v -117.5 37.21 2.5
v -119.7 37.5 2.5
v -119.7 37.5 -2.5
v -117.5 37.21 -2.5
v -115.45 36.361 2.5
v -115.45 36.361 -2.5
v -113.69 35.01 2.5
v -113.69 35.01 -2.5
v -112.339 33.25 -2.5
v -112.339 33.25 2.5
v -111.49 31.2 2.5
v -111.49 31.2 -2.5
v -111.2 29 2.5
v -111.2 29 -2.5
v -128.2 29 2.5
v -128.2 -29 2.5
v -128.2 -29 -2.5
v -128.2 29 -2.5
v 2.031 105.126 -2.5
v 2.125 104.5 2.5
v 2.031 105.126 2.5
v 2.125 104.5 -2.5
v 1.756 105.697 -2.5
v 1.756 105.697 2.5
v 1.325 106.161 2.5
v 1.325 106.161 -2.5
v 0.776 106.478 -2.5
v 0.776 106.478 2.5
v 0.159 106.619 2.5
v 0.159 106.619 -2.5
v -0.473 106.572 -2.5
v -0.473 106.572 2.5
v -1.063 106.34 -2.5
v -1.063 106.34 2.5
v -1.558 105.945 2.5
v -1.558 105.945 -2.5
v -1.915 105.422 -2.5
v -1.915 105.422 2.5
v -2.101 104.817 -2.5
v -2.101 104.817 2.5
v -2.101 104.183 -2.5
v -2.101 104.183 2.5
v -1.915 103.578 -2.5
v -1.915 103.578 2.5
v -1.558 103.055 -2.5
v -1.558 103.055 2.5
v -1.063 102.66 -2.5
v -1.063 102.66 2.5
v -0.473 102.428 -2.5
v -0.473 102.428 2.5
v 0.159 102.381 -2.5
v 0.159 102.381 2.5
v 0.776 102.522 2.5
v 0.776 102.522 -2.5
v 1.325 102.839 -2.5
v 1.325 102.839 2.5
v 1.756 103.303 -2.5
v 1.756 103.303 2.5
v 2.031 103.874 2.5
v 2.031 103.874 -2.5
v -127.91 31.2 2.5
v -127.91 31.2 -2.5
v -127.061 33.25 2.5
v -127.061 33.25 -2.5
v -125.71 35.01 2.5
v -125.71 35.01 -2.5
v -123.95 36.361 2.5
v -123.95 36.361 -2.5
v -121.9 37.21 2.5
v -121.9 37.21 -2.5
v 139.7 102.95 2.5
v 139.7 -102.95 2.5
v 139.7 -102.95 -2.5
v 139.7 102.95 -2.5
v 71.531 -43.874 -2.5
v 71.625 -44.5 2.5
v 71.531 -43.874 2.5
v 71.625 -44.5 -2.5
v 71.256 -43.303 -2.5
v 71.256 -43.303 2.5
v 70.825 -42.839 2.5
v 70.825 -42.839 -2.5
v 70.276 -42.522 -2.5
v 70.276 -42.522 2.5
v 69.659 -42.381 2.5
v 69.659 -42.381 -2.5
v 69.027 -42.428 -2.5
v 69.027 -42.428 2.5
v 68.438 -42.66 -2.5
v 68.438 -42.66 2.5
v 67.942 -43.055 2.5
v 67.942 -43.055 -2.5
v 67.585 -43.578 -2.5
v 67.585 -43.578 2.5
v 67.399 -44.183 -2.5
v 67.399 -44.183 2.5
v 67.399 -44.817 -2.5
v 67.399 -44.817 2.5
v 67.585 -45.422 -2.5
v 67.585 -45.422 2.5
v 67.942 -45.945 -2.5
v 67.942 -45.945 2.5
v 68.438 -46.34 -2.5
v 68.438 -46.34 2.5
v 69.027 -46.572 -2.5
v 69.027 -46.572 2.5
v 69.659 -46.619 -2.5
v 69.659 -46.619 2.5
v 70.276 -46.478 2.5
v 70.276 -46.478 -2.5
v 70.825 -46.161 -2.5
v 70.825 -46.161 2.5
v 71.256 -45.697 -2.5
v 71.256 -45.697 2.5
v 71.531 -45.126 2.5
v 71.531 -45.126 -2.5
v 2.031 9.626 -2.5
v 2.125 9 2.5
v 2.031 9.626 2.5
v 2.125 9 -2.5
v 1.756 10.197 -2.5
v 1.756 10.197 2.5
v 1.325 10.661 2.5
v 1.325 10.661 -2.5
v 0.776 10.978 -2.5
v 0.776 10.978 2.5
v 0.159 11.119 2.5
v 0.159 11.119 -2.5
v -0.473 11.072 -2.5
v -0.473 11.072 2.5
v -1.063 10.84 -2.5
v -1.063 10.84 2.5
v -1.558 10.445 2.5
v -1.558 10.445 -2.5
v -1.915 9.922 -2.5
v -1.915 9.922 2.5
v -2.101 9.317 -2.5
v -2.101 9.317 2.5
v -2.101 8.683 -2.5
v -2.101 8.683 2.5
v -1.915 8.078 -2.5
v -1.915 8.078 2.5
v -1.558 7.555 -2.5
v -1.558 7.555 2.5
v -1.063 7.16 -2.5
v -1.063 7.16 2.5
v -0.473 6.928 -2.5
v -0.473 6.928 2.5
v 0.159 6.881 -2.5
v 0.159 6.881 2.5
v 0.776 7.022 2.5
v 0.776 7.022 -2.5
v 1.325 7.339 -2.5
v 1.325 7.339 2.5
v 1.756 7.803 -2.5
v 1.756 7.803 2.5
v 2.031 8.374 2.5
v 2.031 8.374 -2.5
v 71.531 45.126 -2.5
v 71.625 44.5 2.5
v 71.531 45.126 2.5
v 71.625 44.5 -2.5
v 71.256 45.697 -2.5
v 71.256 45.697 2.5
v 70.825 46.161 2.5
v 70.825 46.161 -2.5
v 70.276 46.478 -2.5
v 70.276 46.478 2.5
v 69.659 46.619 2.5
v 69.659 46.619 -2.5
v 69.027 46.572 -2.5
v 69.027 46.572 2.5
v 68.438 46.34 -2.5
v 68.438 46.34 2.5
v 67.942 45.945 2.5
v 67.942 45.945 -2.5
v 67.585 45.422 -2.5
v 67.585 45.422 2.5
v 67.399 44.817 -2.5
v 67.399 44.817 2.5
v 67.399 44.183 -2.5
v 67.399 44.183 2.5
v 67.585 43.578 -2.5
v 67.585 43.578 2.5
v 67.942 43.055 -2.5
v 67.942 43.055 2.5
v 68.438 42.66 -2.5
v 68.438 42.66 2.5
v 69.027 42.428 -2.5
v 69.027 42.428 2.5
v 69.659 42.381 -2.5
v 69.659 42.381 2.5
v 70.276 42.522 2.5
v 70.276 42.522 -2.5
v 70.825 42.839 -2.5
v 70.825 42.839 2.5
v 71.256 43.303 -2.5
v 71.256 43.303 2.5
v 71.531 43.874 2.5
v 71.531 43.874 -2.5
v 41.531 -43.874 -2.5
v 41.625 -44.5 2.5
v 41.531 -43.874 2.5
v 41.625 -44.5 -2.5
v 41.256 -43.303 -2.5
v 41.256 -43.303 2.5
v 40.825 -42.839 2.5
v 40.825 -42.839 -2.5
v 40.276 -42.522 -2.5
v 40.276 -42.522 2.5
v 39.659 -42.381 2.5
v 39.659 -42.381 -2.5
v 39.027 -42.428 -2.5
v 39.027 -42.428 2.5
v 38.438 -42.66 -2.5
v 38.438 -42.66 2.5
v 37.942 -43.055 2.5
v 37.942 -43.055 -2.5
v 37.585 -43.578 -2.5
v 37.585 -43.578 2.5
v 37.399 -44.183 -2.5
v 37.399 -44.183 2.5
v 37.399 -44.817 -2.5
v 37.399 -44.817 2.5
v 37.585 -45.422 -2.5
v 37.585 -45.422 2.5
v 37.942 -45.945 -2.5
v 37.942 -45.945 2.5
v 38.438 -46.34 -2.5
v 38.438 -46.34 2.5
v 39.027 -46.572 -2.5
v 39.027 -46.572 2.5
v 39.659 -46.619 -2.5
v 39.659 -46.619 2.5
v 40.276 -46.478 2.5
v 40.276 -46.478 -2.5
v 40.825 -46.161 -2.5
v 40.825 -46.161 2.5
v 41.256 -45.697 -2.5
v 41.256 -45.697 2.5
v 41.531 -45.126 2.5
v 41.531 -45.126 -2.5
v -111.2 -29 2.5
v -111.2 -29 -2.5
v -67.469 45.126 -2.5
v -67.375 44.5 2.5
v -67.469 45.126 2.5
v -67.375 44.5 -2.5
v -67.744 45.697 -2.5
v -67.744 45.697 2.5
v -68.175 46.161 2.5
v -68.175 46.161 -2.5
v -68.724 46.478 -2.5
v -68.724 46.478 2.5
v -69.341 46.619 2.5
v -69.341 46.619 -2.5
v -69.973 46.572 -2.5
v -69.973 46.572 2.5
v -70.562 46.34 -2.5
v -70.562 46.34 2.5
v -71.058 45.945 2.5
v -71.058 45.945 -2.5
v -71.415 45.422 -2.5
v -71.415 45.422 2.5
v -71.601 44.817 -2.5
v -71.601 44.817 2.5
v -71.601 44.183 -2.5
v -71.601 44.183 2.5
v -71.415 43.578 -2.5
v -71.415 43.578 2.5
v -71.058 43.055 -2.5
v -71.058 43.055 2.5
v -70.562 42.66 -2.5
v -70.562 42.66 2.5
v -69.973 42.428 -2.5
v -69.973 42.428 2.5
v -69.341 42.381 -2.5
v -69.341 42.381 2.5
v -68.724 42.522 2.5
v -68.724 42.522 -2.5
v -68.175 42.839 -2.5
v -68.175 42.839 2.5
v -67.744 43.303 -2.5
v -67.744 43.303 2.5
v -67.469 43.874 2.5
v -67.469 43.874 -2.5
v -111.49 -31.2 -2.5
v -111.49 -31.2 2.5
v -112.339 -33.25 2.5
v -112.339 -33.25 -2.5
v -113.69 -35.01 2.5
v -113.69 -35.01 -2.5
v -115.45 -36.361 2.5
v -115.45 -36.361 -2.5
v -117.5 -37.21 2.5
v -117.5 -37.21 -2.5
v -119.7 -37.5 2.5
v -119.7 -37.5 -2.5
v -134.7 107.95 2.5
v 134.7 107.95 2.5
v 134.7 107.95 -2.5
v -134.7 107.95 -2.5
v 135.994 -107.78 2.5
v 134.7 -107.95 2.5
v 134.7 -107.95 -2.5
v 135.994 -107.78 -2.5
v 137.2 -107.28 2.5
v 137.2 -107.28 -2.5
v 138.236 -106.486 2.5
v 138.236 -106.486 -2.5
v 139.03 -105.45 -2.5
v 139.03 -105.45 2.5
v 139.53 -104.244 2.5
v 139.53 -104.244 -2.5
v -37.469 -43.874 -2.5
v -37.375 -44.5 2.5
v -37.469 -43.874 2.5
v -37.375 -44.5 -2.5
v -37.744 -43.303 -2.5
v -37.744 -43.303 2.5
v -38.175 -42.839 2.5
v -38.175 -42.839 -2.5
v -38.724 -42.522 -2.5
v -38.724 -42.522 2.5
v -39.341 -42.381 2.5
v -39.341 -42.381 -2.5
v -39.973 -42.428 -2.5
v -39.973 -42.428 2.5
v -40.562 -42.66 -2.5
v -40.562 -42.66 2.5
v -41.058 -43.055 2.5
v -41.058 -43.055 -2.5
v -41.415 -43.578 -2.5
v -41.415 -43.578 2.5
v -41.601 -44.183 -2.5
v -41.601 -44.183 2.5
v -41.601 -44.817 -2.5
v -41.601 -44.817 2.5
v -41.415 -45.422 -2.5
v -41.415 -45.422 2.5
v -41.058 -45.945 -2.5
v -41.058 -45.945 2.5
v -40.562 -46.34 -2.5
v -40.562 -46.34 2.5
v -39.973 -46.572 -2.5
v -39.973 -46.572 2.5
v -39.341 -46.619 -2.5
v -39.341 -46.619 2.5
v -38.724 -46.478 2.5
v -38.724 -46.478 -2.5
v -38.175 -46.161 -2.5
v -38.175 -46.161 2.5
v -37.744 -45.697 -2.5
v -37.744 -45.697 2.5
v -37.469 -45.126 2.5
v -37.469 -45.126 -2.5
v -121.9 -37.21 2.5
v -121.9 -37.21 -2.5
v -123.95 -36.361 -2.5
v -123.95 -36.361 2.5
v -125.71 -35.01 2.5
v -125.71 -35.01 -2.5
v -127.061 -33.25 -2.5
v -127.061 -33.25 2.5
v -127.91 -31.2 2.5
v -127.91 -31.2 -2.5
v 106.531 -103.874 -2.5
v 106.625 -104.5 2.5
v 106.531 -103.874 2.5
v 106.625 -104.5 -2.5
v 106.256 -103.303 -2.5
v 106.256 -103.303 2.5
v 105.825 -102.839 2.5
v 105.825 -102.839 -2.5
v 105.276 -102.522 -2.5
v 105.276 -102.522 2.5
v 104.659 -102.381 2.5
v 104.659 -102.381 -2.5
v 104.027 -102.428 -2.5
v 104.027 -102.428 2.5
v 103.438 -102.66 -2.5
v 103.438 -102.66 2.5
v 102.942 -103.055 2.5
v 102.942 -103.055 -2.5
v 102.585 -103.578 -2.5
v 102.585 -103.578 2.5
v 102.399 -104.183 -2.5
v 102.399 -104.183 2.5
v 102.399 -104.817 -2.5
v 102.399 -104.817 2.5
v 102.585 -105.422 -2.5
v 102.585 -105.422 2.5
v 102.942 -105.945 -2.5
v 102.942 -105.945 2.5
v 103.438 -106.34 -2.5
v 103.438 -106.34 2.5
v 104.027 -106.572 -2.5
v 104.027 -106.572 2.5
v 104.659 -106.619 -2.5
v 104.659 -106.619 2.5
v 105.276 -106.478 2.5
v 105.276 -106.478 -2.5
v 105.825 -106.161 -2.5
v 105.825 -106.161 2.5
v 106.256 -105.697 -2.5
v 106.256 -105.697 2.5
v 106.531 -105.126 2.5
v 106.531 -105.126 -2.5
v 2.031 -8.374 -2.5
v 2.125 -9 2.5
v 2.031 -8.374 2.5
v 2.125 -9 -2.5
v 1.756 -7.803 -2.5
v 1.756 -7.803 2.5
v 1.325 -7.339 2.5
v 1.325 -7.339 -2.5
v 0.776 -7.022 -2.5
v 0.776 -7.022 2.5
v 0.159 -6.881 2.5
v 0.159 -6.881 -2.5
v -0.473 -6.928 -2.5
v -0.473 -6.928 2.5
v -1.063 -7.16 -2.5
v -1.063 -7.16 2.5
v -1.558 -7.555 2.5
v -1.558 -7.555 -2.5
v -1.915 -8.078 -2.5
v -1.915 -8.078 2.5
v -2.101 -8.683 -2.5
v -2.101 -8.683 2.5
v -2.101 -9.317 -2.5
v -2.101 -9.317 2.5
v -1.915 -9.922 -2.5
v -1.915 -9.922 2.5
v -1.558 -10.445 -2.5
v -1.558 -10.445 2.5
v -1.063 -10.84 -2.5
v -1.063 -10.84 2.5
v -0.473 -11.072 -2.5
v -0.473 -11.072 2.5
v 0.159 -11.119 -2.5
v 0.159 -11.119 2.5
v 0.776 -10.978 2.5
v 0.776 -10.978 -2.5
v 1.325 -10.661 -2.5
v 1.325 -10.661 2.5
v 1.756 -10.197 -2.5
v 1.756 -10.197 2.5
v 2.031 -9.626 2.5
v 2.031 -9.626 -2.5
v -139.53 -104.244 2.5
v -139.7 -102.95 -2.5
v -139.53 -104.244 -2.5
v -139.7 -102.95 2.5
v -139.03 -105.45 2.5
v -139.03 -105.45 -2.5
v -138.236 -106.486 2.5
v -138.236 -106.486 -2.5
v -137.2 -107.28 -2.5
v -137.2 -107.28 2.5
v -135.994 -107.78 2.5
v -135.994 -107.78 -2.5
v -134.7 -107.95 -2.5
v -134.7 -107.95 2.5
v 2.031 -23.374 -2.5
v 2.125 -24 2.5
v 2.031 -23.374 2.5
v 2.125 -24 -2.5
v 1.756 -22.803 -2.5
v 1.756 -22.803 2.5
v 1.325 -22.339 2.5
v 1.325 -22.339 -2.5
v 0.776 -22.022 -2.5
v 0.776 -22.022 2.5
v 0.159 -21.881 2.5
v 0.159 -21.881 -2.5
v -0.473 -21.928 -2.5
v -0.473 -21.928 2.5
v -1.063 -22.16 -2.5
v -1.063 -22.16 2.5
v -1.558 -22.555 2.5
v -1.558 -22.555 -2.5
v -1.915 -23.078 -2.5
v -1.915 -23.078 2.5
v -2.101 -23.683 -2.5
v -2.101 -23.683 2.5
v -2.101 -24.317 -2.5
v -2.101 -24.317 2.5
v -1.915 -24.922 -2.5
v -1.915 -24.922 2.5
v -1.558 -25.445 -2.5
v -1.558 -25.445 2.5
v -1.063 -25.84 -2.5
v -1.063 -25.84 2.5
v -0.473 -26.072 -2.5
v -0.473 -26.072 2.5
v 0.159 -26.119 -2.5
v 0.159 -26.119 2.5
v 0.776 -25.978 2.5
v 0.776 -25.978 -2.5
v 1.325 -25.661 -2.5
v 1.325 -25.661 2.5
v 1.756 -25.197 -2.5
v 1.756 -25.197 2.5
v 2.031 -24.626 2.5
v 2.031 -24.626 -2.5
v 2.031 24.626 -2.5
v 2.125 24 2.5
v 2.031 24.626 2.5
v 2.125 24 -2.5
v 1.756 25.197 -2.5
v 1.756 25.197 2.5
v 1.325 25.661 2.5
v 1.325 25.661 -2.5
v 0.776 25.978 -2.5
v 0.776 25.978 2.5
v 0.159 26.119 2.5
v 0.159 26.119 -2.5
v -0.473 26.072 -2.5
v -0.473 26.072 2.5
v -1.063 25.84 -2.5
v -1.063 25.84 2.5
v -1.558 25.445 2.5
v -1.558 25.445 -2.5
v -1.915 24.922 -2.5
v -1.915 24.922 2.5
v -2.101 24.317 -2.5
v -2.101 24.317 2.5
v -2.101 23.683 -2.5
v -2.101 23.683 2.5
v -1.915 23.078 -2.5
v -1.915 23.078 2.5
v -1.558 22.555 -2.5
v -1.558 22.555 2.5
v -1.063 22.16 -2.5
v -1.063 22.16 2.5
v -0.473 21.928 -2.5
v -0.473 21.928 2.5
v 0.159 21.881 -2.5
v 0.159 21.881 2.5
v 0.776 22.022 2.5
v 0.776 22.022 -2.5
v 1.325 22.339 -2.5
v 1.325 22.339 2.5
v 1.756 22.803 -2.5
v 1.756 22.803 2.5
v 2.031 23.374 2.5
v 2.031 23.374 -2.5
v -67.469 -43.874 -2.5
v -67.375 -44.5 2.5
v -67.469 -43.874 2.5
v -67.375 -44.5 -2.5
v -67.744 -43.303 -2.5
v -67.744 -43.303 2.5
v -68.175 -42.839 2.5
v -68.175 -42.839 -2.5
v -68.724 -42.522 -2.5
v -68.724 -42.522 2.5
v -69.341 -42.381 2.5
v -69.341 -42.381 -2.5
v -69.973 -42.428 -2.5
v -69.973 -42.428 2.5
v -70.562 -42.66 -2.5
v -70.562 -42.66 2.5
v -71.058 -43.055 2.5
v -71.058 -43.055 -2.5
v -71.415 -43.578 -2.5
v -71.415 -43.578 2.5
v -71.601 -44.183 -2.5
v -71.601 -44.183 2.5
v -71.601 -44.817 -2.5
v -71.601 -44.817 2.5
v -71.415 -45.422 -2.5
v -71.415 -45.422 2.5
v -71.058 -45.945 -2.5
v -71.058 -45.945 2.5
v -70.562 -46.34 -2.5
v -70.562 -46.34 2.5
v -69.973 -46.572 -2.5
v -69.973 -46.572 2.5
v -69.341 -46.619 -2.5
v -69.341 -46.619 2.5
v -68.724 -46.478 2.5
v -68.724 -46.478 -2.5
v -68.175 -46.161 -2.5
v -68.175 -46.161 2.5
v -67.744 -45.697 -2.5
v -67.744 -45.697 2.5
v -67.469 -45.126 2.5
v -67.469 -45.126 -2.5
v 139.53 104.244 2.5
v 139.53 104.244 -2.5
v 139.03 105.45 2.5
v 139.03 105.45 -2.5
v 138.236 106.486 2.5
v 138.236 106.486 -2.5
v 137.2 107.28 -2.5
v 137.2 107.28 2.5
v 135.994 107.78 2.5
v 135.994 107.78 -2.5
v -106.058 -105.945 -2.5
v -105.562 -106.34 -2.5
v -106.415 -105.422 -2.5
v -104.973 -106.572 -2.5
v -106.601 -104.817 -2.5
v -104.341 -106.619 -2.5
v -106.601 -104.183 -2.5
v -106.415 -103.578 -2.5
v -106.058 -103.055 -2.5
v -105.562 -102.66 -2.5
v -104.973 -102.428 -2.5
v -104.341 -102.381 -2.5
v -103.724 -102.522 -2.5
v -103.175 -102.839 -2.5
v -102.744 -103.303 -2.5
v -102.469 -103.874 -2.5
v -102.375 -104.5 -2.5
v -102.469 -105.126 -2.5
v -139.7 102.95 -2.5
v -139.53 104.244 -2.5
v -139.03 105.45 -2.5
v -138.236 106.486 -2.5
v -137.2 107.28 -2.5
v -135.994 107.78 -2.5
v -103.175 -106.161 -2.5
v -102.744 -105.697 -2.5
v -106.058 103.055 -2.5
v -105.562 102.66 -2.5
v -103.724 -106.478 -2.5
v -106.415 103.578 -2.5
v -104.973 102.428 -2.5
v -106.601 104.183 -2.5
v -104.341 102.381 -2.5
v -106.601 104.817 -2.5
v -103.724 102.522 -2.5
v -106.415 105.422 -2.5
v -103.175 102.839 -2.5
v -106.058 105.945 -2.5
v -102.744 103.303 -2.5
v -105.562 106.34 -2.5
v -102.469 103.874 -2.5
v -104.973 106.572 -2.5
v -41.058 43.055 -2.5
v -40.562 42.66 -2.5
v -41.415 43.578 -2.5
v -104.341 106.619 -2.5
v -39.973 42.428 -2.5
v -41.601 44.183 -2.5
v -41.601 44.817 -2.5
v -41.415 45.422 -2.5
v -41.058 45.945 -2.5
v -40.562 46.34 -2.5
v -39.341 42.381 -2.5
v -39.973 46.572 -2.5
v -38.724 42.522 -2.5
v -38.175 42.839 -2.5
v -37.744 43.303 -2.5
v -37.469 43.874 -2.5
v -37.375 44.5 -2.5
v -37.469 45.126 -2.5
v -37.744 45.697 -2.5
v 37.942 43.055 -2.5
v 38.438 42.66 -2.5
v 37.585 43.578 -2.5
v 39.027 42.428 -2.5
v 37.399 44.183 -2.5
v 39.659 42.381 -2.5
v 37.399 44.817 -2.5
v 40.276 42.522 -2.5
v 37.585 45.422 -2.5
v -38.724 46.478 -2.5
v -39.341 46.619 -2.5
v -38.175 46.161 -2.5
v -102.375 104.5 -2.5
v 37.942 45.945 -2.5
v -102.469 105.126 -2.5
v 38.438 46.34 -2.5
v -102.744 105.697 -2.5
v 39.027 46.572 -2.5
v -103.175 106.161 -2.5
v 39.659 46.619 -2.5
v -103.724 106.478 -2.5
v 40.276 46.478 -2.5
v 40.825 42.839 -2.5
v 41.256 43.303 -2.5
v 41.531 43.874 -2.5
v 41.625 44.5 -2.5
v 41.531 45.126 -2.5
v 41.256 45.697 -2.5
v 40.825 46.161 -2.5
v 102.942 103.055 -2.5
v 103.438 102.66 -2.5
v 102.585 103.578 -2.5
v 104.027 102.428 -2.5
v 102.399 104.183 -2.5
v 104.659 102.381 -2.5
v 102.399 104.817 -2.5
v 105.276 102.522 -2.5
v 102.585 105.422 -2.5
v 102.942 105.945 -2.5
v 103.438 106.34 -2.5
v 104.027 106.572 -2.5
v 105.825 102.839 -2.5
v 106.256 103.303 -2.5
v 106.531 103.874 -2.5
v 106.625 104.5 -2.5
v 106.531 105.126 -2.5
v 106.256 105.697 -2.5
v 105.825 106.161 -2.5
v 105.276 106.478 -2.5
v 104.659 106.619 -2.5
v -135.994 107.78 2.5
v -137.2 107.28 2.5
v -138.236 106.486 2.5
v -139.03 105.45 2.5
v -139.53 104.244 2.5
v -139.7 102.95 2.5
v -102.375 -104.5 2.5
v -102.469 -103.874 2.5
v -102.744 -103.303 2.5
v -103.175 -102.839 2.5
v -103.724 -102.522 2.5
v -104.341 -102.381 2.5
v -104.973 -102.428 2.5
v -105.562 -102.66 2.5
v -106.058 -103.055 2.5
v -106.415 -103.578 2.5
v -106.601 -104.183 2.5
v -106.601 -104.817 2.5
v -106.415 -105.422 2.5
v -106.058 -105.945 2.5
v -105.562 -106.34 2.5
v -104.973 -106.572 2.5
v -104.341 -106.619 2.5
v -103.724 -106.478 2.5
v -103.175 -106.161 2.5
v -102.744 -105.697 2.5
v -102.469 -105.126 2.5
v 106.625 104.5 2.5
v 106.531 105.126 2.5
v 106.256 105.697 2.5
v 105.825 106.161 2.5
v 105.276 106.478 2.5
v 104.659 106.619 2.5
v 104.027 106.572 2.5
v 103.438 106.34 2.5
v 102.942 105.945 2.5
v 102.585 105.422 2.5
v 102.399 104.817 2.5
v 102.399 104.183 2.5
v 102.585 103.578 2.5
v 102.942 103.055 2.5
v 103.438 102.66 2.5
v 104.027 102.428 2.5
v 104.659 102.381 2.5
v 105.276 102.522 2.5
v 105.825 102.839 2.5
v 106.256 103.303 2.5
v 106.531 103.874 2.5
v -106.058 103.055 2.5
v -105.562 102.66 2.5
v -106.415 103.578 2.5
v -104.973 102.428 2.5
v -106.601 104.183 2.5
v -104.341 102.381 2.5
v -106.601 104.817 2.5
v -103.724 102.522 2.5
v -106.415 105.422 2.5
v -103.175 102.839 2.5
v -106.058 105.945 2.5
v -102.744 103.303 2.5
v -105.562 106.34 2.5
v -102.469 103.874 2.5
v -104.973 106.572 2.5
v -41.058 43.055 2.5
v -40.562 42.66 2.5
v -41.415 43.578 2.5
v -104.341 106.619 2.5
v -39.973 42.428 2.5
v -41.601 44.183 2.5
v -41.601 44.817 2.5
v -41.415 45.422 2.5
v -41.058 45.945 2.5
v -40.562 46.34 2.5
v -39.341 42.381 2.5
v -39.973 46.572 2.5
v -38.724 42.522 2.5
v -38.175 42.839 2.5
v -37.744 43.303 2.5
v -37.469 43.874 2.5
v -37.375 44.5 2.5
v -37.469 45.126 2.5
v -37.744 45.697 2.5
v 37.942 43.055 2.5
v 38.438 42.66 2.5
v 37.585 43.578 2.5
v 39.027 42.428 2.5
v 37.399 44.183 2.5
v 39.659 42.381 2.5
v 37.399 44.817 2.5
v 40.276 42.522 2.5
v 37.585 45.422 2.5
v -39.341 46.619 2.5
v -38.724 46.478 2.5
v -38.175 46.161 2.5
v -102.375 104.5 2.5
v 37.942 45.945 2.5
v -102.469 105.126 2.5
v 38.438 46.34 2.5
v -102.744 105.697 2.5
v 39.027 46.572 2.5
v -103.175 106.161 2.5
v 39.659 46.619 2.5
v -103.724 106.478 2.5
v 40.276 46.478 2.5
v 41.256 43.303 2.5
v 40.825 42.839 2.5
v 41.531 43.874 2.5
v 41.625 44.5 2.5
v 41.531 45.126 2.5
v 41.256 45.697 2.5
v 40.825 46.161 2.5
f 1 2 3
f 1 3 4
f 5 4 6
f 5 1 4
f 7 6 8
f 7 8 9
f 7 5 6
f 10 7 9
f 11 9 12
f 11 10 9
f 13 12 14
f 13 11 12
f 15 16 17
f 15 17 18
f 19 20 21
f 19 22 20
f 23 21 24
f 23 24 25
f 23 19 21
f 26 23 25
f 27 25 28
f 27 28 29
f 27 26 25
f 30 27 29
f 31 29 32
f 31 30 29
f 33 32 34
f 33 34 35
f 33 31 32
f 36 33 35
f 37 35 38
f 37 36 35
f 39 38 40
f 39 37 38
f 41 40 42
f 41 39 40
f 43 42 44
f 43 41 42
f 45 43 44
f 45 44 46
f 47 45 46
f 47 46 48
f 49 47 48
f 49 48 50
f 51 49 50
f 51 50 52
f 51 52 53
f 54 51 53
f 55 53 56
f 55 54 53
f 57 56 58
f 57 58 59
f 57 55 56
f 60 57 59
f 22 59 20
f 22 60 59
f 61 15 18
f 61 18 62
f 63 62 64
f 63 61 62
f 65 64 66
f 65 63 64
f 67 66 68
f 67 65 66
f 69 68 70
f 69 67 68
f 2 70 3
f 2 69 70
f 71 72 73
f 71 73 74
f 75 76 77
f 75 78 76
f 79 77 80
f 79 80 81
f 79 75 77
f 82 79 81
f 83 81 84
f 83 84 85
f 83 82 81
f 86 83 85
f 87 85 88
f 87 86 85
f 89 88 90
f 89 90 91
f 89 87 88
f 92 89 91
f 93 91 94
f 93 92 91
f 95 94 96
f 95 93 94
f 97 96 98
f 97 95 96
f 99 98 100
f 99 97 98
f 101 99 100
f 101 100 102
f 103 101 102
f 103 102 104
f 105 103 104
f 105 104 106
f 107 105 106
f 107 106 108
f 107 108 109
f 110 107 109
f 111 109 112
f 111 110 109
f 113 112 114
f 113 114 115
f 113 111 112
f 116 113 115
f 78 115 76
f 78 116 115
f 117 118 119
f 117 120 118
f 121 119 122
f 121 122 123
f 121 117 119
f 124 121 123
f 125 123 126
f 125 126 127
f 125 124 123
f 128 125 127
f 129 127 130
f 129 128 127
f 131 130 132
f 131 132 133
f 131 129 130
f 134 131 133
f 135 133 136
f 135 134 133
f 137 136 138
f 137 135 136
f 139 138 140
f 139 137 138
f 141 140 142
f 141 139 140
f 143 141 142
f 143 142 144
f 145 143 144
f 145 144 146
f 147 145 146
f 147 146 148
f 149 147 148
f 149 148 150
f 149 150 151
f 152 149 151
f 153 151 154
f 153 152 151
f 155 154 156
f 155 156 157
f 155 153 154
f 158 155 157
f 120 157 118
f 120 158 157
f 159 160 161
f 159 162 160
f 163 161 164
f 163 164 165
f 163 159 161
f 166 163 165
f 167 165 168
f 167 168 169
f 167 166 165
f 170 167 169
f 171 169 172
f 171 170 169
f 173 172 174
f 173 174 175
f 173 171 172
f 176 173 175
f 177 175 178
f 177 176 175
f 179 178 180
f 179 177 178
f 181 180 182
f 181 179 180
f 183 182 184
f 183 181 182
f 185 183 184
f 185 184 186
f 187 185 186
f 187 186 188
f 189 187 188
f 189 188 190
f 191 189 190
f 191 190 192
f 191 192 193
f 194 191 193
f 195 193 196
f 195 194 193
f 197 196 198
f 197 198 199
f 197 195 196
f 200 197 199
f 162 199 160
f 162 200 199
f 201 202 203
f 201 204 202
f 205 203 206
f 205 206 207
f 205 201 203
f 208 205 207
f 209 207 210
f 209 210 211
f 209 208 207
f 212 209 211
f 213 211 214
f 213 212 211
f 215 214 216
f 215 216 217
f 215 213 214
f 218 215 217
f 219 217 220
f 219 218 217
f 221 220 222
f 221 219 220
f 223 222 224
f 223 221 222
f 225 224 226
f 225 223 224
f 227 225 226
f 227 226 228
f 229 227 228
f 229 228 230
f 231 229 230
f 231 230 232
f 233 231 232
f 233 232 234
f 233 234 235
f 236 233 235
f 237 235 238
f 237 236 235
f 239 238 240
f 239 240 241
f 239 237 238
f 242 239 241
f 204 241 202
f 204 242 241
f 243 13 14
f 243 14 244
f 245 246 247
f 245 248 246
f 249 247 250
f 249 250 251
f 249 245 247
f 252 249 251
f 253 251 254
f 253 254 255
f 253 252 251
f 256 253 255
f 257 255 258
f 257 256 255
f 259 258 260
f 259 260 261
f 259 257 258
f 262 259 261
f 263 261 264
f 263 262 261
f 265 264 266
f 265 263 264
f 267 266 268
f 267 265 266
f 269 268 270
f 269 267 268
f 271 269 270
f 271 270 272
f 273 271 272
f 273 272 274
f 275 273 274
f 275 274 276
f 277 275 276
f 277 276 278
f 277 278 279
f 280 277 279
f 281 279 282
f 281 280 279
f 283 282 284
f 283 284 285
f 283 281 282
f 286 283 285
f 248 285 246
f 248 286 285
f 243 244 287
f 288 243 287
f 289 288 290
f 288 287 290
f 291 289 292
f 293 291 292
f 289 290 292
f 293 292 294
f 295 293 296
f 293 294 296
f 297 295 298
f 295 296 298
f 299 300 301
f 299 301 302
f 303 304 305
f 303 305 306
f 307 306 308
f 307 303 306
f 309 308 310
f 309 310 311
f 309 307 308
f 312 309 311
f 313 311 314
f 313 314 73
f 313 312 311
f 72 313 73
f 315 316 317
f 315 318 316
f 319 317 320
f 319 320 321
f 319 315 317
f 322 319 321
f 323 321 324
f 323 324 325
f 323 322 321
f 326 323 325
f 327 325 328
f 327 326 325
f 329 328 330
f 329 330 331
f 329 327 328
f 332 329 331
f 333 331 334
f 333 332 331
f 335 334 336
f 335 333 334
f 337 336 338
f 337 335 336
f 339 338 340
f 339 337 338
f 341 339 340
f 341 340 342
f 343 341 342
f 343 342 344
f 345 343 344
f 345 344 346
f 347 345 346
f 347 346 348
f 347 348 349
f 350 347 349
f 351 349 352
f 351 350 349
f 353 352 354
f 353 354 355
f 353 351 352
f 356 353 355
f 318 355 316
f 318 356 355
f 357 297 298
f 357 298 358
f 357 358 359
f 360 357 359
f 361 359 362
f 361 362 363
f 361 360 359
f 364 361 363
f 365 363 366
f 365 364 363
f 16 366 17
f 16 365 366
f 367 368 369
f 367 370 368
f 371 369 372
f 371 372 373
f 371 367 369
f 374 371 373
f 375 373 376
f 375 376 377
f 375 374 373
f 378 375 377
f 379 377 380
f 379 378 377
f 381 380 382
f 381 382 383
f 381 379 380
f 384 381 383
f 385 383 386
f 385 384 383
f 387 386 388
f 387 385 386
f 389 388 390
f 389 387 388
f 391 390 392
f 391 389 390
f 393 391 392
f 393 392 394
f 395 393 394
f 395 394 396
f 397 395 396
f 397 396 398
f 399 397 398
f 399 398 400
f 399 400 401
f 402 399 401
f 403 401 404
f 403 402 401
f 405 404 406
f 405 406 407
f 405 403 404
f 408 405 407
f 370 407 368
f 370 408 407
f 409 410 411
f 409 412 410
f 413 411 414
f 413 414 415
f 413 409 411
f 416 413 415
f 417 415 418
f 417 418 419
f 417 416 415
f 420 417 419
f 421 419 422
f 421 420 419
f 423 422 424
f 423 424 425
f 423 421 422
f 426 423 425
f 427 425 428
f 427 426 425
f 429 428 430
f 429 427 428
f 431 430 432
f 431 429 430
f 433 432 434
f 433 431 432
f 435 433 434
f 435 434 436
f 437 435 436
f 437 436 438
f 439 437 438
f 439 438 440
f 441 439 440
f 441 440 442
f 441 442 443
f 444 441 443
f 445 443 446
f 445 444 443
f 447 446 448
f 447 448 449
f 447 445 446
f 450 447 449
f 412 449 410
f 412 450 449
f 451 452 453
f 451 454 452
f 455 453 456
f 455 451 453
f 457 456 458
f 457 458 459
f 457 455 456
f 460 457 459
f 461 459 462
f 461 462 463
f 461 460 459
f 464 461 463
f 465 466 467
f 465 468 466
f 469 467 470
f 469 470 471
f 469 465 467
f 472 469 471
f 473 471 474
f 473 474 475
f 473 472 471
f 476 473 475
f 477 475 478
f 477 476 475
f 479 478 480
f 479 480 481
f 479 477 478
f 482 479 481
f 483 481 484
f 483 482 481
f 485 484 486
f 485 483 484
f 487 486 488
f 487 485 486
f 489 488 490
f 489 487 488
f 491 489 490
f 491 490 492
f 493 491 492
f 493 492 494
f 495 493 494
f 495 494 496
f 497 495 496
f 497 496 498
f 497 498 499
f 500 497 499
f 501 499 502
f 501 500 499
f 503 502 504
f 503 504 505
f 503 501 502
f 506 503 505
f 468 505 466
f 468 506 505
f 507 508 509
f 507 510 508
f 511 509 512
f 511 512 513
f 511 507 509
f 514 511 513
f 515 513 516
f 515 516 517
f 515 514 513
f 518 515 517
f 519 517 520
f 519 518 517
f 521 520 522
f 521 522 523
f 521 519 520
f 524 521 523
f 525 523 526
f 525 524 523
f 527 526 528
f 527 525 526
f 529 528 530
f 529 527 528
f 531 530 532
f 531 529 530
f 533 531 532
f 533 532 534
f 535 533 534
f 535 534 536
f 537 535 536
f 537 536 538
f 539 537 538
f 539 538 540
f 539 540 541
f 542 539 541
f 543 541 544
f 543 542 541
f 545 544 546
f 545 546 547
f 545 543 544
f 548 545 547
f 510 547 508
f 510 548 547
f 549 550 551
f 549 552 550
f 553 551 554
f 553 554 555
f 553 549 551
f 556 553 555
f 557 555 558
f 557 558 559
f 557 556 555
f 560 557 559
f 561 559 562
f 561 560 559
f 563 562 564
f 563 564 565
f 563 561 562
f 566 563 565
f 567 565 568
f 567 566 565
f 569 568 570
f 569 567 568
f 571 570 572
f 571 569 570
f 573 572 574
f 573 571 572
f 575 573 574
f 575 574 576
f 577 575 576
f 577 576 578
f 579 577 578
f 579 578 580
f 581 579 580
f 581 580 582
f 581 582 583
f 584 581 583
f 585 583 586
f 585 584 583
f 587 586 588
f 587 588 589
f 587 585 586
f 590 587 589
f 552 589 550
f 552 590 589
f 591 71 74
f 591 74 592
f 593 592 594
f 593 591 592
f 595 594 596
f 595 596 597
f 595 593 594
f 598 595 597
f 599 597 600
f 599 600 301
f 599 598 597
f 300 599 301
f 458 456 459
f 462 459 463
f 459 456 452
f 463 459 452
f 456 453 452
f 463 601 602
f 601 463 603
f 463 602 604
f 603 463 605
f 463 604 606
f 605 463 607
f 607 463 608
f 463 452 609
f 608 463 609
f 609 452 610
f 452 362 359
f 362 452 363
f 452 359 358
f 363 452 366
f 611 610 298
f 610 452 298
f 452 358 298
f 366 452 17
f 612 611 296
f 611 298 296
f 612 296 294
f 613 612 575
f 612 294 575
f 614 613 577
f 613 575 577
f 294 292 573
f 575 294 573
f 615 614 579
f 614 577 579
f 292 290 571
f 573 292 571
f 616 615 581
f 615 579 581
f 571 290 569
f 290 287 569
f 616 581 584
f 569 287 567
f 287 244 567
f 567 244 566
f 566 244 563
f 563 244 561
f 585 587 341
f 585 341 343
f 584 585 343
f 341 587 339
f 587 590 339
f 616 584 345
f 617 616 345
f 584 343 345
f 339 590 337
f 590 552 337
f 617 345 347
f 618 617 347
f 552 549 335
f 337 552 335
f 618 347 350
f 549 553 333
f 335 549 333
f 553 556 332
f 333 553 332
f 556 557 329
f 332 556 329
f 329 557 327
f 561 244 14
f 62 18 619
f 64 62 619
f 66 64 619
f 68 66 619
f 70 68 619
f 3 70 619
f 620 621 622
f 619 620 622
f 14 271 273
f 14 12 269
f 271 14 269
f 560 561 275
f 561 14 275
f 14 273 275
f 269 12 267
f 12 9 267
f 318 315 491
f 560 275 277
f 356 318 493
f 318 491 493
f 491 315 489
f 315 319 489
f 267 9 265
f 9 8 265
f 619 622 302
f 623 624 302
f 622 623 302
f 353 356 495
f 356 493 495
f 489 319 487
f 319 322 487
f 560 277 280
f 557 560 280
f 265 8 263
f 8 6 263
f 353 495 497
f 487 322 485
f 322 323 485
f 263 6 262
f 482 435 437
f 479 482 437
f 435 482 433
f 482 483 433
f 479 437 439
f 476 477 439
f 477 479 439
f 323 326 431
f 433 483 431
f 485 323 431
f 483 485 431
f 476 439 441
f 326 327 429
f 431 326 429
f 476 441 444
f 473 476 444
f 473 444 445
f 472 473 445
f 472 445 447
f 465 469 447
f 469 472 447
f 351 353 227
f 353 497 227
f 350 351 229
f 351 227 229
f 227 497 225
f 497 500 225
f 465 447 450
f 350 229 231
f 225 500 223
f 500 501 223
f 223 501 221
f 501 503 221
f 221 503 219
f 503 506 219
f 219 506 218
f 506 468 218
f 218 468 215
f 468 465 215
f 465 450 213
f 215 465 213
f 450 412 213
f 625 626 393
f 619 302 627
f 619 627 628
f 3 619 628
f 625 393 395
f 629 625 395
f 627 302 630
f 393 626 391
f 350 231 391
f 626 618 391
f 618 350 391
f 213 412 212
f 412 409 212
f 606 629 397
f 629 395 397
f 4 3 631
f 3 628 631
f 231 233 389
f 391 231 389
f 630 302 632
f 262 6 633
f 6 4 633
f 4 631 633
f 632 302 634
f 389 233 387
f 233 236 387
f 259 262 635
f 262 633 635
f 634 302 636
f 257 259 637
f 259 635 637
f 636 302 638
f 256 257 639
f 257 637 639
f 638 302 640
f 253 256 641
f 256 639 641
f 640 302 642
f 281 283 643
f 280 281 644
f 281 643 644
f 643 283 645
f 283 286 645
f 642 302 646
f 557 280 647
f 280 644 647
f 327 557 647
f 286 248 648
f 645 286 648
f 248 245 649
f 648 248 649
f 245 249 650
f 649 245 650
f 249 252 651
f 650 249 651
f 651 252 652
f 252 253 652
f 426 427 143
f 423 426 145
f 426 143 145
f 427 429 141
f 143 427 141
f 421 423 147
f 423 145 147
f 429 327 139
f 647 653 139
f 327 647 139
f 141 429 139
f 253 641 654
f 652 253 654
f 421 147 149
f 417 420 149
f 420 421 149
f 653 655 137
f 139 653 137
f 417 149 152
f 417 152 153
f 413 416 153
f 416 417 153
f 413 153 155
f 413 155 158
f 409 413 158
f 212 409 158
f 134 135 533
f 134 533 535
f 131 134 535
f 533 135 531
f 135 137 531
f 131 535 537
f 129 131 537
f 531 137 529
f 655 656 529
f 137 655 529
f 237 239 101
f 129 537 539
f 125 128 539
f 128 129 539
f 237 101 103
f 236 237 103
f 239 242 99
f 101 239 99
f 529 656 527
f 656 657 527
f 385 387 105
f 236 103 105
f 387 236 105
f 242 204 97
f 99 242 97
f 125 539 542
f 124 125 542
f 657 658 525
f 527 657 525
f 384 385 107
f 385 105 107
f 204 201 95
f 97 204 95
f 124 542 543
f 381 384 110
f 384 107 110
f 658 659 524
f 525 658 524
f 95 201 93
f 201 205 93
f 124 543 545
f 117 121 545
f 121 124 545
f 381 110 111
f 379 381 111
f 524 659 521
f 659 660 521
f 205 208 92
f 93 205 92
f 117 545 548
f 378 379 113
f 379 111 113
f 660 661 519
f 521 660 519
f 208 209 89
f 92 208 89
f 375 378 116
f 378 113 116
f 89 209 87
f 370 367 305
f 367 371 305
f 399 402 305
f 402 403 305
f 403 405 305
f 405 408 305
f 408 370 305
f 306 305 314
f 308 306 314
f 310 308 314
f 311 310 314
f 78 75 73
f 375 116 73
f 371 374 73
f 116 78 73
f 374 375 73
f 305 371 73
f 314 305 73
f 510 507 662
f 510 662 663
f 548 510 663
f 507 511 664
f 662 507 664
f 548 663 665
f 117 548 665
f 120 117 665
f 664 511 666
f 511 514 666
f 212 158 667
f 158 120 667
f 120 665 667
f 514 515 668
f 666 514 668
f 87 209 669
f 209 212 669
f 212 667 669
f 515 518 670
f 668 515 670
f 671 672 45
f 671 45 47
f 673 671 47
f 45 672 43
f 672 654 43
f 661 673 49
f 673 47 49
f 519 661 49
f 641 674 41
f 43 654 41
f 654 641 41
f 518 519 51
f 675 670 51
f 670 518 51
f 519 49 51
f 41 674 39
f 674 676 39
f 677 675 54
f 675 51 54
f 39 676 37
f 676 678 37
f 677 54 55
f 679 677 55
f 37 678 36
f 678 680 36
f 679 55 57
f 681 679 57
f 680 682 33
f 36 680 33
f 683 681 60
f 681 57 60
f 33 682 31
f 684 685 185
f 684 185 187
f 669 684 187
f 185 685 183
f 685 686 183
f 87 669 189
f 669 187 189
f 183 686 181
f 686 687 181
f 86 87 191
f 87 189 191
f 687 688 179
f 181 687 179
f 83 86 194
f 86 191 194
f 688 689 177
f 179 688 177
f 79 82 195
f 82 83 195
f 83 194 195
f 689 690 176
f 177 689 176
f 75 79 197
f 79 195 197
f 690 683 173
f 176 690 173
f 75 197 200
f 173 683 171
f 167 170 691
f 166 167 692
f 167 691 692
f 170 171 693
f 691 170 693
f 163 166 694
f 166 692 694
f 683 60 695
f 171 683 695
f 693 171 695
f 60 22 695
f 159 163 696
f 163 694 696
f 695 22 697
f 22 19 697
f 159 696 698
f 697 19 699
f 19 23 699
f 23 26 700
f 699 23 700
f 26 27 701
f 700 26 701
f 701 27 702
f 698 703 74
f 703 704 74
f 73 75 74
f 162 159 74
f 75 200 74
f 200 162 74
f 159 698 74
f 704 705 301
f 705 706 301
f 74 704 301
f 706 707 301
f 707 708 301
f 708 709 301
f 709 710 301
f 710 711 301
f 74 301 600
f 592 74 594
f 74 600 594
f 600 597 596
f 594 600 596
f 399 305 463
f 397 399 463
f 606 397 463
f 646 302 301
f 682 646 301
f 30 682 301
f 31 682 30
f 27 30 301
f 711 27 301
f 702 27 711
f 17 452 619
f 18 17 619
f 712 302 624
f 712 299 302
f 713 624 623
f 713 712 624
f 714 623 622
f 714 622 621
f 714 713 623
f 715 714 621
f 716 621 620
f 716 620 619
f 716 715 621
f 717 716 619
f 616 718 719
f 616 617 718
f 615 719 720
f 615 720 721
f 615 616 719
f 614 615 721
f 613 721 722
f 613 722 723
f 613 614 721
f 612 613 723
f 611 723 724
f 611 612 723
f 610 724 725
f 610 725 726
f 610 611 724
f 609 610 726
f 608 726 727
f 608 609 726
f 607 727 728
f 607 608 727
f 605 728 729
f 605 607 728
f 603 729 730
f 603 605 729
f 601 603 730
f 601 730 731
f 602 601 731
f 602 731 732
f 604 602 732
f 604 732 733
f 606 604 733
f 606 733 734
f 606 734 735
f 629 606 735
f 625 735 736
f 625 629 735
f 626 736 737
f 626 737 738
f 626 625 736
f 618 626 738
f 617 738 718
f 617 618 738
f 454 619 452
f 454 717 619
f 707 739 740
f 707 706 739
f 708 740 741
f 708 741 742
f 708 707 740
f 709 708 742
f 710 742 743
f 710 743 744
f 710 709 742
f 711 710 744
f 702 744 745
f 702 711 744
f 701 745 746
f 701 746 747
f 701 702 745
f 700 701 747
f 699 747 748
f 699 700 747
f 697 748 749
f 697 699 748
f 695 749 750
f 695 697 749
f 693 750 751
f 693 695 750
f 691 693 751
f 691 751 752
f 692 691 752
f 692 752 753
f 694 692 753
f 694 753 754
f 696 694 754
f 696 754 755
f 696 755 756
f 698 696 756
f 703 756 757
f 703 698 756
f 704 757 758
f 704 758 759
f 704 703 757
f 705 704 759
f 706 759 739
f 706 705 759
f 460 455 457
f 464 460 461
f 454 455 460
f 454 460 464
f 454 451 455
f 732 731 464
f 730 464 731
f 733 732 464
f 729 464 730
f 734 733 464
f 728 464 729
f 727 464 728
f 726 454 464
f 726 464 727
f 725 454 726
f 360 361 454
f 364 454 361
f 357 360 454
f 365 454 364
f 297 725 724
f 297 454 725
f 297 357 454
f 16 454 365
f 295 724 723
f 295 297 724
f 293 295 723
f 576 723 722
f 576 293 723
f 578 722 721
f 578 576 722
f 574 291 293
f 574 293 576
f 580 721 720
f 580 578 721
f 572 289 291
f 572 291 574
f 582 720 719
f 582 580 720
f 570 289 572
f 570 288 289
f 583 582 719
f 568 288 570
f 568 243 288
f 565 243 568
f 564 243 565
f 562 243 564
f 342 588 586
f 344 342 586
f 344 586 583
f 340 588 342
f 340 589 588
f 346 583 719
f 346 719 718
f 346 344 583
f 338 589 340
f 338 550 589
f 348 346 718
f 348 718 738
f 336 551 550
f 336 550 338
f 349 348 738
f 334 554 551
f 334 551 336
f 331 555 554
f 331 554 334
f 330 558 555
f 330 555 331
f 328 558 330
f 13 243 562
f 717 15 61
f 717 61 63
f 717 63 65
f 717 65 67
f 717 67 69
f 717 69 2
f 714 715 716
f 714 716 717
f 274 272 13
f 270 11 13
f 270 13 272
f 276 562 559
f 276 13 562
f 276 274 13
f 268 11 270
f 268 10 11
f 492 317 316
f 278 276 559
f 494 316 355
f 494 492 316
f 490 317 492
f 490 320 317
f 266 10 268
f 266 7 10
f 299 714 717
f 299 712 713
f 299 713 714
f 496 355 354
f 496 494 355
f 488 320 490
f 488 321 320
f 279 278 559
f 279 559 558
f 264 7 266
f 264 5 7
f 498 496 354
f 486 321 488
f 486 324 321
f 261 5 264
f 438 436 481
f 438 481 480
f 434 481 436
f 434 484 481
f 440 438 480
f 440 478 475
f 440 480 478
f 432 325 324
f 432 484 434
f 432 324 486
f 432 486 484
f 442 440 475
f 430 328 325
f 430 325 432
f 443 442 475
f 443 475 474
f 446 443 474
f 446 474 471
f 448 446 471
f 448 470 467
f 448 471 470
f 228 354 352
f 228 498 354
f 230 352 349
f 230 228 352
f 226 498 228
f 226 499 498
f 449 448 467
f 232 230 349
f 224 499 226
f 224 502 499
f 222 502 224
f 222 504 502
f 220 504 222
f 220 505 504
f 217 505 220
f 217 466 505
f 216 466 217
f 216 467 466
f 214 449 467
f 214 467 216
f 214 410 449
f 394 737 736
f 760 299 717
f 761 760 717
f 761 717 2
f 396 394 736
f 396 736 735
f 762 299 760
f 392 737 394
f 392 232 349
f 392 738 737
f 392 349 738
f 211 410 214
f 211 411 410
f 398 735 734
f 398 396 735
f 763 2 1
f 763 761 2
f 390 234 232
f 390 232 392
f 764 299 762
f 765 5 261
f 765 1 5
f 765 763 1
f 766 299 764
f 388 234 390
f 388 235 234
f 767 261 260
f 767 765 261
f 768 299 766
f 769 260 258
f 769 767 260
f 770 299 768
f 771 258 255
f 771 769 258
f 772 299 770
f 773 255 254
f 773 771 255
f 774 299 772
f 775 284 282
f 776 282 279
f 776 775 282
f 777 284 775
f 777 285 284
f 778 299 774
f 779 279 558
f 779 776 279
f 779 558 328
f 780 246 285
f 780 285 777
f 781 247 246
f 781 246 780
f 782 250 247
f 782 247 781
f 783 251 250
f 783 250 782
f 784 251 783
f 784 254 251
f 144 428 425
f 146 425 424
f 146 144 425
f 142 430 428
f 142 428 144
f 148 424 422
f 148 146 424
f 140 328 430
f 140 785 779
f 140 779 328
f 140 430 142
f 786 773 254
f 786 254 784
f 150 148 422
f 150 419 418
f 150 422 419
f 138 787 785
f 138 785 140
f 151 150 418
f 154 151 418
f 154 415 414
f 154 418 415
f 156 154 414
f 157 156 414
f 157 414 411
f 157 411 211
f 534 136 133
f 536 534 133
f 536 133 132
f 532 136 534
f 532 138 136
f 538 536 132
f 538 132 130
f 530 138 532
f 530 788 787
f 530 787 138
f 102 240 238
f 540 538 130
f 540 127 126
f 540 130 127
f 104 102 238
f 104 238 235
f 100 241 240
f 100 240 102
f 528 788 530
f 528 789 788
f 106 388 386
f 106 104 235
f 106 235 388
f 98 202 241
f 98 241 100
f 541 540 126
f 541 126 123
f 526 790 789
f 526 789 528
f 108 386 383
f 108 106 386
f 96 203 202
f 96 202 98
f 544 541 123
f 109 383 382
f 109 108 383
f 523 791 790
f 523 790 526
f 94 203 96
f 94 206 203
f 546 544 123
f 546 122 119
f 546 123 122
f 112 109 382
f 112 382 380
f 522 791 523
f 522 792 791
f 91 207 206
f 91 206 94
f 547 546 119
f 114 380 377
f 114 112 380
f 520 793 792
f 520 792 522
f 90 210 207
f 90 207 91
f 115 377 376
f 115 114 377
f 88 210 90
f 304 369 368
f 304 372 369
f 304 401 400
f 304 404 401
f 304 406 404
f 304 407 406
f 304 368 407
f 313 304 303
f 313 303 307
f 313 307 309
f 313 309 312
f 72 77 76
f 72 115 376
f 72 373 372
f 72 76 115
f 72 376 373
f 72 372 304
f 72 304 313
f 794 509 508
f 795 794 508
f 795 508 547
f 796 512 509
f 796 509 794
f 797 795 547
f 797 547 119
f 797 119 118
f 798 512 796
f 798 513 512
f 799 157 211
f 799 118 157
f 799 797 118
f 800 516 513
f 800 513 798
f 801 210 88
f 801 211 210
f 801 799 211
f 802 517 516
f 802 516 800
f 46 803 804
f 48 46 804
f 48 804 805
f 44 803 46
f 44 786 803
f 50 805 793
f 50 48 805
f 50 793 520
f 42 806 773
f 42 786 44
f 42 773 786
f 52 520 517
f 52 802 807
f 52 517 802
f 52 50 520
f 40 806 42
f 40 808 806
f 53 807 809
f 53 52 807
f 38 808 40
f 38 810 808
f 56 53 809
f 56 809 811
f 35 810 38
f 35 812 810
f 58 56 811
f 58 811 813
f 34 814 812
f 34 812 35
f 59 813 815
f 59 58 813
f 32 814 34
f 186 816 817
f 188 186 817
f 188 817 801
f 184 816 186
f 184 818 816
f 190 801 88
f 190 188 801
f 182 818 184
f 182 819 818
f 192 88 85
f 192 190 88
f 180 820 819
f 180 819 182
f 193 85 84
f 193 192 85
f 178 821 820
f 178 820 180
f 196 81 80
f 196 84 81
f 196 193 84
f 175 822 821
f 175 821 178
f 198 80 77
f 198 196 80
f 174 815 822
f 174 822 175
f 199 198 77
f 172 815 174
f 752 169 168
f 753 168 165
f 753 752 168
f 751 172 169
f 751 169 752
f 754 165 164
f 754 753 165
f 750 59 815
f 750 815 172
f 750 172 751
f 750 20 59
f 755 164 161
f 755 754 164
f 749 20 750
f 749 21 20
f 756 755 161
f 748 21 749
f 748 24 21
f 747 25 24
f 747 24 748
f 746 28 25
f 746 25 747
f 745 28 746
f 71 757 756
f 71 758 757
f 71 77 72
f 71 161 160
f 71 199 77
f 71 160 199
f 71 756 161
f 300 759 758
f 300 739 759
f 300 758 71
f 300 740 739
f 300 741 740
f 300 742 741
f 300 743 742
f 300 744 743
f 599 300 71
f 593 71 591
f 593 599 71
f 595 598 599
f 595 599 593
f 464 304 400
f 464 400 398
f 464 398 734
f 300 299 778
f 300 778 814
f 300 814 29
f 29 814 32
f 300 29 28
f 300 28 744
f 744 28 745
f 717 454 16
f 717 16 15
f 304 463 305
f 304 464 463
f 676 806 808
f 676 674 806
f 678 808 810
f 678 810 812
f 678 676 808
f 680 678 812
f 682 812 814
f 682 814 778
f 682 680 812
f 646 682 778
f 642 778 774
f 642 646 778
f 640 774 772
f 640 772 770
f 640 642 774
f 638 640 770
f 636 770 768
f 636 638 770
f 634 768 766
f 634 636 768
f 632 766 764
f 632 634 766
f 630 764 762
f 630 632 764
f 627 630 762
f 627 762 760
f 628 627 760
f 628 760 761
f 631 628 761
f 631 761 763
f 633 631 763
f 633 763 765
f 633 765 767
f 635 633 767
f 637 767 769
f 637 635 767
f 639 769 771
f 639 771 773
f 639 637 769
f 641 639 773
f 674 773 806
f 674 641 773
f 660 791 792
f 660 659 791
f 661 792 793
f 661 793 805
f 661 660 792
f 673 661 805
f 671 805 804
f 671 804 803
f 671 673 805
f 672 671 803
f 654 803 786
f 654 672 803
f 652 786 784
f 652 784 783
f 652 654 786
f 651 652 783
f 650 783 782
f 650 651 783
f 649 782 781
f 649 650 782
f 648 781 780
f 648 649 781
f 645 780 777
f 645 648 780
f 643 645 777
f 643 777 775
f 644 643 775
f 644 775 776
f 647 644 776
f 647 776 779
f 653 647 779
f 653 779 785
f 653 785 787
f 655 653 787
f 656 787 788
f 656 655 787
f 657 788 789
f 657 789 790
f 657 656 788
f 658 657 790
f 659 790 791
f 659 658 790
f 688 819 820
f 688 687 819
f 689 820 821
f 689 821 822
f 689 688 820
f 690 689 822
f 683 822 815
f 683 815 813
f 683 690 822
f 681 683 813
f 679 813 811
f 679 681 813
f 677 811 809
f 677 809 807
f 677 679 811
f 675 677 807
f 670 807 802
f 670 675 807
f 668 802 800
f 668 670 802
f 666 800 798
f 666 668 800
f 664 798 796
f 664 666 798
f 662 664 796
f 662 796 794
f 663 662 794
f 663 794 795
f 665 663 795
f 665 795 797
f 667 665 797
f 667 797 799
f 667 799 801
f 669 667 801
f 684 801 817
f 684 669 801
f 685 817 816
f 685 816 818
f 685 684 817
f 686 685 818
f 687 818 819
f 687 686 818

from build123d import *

# Parameters (mm, degrees)
F0_R     = 2.125
F1_DEPTH = 2.5


with BuildPart() as f1:
    # F0 (on Top) → F1 (new body, symmetric)
    with BuildSketch(Plane.XY):
        with BuildLine():
            Line((-134.7, -107.95), (134.7, -107.95))
            ThreePointArc((134.7, -107.95), (138.235534, -106.485534), (139.7, -102.95))
            Line((139.7, -102.95), (139.7, 0))
            Line((139.7, 0), (139.7, 102.95))
            ThreePointArc((139.7, 102.95), (138.235534, 106.485534), (134.7, 107.95))
            Line((134.7, 107.95), (-134.7, 107.95))
            ThreePointArc((-134.7, 107.95), (-138.235534, 106.485534), (-139.7, 102.95))
            Line((-139.7, 102.95), (-139.7, 0))
            Line((-139.7, 0), (-139.7, -102.95))
            ThreePointArc((-139.7, -102.95), (-138.235534, -106.485534), (-134.7, -107.95))
        make_face()
        with Locations((-104.5, -104.5)):
            Circle(F0_R, mode=Mode.SUBTRACT)
        with Locations((-69.5, -44.5)):
            Circle(F0_R, mode=Mode.SUBTRACT)
        with Locations((-39.5, -44.5)):
            Circle(F0_R, mode=Mode.SUBTRACT)
        with Locations((104.5, -104.5)):
            Circle(F0_R, mode=Mode.SUBTRACT)
        with Locations((39.5, -44.5)):
            Circle(F0_R, mode=Mode.SUBTRACT)
        with Locations((69.5, -44.5)):
            Circle(F0_R, mode=Mode.SUBTRACT)
        with Locations((0, -24)):
            Circle(F0_R, mode=Mode.SUBTRACT)
        with Locations((0, -9)):
            Circle(F0_R, mode=Mode.SUBTRACT)
        with BuildLine():
            ThreePointArc((-119.7, 37.5), (-113.689592, 35.010408), (-111.2, 29))
            Line((-111.2, 29), (-111.2, -29))
            ThreePointArc((-111.2, -29), (-113.689592, -35.010408), (-119.7, -37.5))
            ThreePointArc((-119.7, -37.5), (-125.710408, -35.010408), (-128.2, -29))
            Line((-128.2, -29), (-128.2, 29))
            ThreePointArc((-128.2, 29), (-125.710408, 35.010408), (-119.7, 37.5))
        make_face(mode=Mode.SUBTRACT)
        with Locations((-69.5, 44.5)):
            Circle(F0_R, mode=Mode.SUBTRACT)
        with Locations((-39.5, 44.5)):
            Circle(F0_R, mode=Mode.SUBTRACT)
        with Locations((-104.5, 104.5)):
            Circle(F0_R, mode=Mode.SUBTRACT)
        with Locations((0, 9)):
            Circle(F0_R, mode=Mode.SUBTRACT)
        with Locations((0, 24)):
            Circle(F0_R, mode=Mode.SUBTRACT)
        with Locations((39.5, 44.5)):
            Circle(F0_R, mode=Mode.SUBTRACT)
        with Locations((69.5, 44.5)):
            Circle(F0_R, mode=Mode.SUBTRACT)
        with Locations((0, 104.5)):
            Circle(F0_R, mode=Mode.SUBTRACT)
        with Locations((104.5, 104.5)):
            Circle(F0_R, mode=Mode.SUBTRACT)
    extrude(amount=F1_DEPTH, both=True)


solid = f1.part
